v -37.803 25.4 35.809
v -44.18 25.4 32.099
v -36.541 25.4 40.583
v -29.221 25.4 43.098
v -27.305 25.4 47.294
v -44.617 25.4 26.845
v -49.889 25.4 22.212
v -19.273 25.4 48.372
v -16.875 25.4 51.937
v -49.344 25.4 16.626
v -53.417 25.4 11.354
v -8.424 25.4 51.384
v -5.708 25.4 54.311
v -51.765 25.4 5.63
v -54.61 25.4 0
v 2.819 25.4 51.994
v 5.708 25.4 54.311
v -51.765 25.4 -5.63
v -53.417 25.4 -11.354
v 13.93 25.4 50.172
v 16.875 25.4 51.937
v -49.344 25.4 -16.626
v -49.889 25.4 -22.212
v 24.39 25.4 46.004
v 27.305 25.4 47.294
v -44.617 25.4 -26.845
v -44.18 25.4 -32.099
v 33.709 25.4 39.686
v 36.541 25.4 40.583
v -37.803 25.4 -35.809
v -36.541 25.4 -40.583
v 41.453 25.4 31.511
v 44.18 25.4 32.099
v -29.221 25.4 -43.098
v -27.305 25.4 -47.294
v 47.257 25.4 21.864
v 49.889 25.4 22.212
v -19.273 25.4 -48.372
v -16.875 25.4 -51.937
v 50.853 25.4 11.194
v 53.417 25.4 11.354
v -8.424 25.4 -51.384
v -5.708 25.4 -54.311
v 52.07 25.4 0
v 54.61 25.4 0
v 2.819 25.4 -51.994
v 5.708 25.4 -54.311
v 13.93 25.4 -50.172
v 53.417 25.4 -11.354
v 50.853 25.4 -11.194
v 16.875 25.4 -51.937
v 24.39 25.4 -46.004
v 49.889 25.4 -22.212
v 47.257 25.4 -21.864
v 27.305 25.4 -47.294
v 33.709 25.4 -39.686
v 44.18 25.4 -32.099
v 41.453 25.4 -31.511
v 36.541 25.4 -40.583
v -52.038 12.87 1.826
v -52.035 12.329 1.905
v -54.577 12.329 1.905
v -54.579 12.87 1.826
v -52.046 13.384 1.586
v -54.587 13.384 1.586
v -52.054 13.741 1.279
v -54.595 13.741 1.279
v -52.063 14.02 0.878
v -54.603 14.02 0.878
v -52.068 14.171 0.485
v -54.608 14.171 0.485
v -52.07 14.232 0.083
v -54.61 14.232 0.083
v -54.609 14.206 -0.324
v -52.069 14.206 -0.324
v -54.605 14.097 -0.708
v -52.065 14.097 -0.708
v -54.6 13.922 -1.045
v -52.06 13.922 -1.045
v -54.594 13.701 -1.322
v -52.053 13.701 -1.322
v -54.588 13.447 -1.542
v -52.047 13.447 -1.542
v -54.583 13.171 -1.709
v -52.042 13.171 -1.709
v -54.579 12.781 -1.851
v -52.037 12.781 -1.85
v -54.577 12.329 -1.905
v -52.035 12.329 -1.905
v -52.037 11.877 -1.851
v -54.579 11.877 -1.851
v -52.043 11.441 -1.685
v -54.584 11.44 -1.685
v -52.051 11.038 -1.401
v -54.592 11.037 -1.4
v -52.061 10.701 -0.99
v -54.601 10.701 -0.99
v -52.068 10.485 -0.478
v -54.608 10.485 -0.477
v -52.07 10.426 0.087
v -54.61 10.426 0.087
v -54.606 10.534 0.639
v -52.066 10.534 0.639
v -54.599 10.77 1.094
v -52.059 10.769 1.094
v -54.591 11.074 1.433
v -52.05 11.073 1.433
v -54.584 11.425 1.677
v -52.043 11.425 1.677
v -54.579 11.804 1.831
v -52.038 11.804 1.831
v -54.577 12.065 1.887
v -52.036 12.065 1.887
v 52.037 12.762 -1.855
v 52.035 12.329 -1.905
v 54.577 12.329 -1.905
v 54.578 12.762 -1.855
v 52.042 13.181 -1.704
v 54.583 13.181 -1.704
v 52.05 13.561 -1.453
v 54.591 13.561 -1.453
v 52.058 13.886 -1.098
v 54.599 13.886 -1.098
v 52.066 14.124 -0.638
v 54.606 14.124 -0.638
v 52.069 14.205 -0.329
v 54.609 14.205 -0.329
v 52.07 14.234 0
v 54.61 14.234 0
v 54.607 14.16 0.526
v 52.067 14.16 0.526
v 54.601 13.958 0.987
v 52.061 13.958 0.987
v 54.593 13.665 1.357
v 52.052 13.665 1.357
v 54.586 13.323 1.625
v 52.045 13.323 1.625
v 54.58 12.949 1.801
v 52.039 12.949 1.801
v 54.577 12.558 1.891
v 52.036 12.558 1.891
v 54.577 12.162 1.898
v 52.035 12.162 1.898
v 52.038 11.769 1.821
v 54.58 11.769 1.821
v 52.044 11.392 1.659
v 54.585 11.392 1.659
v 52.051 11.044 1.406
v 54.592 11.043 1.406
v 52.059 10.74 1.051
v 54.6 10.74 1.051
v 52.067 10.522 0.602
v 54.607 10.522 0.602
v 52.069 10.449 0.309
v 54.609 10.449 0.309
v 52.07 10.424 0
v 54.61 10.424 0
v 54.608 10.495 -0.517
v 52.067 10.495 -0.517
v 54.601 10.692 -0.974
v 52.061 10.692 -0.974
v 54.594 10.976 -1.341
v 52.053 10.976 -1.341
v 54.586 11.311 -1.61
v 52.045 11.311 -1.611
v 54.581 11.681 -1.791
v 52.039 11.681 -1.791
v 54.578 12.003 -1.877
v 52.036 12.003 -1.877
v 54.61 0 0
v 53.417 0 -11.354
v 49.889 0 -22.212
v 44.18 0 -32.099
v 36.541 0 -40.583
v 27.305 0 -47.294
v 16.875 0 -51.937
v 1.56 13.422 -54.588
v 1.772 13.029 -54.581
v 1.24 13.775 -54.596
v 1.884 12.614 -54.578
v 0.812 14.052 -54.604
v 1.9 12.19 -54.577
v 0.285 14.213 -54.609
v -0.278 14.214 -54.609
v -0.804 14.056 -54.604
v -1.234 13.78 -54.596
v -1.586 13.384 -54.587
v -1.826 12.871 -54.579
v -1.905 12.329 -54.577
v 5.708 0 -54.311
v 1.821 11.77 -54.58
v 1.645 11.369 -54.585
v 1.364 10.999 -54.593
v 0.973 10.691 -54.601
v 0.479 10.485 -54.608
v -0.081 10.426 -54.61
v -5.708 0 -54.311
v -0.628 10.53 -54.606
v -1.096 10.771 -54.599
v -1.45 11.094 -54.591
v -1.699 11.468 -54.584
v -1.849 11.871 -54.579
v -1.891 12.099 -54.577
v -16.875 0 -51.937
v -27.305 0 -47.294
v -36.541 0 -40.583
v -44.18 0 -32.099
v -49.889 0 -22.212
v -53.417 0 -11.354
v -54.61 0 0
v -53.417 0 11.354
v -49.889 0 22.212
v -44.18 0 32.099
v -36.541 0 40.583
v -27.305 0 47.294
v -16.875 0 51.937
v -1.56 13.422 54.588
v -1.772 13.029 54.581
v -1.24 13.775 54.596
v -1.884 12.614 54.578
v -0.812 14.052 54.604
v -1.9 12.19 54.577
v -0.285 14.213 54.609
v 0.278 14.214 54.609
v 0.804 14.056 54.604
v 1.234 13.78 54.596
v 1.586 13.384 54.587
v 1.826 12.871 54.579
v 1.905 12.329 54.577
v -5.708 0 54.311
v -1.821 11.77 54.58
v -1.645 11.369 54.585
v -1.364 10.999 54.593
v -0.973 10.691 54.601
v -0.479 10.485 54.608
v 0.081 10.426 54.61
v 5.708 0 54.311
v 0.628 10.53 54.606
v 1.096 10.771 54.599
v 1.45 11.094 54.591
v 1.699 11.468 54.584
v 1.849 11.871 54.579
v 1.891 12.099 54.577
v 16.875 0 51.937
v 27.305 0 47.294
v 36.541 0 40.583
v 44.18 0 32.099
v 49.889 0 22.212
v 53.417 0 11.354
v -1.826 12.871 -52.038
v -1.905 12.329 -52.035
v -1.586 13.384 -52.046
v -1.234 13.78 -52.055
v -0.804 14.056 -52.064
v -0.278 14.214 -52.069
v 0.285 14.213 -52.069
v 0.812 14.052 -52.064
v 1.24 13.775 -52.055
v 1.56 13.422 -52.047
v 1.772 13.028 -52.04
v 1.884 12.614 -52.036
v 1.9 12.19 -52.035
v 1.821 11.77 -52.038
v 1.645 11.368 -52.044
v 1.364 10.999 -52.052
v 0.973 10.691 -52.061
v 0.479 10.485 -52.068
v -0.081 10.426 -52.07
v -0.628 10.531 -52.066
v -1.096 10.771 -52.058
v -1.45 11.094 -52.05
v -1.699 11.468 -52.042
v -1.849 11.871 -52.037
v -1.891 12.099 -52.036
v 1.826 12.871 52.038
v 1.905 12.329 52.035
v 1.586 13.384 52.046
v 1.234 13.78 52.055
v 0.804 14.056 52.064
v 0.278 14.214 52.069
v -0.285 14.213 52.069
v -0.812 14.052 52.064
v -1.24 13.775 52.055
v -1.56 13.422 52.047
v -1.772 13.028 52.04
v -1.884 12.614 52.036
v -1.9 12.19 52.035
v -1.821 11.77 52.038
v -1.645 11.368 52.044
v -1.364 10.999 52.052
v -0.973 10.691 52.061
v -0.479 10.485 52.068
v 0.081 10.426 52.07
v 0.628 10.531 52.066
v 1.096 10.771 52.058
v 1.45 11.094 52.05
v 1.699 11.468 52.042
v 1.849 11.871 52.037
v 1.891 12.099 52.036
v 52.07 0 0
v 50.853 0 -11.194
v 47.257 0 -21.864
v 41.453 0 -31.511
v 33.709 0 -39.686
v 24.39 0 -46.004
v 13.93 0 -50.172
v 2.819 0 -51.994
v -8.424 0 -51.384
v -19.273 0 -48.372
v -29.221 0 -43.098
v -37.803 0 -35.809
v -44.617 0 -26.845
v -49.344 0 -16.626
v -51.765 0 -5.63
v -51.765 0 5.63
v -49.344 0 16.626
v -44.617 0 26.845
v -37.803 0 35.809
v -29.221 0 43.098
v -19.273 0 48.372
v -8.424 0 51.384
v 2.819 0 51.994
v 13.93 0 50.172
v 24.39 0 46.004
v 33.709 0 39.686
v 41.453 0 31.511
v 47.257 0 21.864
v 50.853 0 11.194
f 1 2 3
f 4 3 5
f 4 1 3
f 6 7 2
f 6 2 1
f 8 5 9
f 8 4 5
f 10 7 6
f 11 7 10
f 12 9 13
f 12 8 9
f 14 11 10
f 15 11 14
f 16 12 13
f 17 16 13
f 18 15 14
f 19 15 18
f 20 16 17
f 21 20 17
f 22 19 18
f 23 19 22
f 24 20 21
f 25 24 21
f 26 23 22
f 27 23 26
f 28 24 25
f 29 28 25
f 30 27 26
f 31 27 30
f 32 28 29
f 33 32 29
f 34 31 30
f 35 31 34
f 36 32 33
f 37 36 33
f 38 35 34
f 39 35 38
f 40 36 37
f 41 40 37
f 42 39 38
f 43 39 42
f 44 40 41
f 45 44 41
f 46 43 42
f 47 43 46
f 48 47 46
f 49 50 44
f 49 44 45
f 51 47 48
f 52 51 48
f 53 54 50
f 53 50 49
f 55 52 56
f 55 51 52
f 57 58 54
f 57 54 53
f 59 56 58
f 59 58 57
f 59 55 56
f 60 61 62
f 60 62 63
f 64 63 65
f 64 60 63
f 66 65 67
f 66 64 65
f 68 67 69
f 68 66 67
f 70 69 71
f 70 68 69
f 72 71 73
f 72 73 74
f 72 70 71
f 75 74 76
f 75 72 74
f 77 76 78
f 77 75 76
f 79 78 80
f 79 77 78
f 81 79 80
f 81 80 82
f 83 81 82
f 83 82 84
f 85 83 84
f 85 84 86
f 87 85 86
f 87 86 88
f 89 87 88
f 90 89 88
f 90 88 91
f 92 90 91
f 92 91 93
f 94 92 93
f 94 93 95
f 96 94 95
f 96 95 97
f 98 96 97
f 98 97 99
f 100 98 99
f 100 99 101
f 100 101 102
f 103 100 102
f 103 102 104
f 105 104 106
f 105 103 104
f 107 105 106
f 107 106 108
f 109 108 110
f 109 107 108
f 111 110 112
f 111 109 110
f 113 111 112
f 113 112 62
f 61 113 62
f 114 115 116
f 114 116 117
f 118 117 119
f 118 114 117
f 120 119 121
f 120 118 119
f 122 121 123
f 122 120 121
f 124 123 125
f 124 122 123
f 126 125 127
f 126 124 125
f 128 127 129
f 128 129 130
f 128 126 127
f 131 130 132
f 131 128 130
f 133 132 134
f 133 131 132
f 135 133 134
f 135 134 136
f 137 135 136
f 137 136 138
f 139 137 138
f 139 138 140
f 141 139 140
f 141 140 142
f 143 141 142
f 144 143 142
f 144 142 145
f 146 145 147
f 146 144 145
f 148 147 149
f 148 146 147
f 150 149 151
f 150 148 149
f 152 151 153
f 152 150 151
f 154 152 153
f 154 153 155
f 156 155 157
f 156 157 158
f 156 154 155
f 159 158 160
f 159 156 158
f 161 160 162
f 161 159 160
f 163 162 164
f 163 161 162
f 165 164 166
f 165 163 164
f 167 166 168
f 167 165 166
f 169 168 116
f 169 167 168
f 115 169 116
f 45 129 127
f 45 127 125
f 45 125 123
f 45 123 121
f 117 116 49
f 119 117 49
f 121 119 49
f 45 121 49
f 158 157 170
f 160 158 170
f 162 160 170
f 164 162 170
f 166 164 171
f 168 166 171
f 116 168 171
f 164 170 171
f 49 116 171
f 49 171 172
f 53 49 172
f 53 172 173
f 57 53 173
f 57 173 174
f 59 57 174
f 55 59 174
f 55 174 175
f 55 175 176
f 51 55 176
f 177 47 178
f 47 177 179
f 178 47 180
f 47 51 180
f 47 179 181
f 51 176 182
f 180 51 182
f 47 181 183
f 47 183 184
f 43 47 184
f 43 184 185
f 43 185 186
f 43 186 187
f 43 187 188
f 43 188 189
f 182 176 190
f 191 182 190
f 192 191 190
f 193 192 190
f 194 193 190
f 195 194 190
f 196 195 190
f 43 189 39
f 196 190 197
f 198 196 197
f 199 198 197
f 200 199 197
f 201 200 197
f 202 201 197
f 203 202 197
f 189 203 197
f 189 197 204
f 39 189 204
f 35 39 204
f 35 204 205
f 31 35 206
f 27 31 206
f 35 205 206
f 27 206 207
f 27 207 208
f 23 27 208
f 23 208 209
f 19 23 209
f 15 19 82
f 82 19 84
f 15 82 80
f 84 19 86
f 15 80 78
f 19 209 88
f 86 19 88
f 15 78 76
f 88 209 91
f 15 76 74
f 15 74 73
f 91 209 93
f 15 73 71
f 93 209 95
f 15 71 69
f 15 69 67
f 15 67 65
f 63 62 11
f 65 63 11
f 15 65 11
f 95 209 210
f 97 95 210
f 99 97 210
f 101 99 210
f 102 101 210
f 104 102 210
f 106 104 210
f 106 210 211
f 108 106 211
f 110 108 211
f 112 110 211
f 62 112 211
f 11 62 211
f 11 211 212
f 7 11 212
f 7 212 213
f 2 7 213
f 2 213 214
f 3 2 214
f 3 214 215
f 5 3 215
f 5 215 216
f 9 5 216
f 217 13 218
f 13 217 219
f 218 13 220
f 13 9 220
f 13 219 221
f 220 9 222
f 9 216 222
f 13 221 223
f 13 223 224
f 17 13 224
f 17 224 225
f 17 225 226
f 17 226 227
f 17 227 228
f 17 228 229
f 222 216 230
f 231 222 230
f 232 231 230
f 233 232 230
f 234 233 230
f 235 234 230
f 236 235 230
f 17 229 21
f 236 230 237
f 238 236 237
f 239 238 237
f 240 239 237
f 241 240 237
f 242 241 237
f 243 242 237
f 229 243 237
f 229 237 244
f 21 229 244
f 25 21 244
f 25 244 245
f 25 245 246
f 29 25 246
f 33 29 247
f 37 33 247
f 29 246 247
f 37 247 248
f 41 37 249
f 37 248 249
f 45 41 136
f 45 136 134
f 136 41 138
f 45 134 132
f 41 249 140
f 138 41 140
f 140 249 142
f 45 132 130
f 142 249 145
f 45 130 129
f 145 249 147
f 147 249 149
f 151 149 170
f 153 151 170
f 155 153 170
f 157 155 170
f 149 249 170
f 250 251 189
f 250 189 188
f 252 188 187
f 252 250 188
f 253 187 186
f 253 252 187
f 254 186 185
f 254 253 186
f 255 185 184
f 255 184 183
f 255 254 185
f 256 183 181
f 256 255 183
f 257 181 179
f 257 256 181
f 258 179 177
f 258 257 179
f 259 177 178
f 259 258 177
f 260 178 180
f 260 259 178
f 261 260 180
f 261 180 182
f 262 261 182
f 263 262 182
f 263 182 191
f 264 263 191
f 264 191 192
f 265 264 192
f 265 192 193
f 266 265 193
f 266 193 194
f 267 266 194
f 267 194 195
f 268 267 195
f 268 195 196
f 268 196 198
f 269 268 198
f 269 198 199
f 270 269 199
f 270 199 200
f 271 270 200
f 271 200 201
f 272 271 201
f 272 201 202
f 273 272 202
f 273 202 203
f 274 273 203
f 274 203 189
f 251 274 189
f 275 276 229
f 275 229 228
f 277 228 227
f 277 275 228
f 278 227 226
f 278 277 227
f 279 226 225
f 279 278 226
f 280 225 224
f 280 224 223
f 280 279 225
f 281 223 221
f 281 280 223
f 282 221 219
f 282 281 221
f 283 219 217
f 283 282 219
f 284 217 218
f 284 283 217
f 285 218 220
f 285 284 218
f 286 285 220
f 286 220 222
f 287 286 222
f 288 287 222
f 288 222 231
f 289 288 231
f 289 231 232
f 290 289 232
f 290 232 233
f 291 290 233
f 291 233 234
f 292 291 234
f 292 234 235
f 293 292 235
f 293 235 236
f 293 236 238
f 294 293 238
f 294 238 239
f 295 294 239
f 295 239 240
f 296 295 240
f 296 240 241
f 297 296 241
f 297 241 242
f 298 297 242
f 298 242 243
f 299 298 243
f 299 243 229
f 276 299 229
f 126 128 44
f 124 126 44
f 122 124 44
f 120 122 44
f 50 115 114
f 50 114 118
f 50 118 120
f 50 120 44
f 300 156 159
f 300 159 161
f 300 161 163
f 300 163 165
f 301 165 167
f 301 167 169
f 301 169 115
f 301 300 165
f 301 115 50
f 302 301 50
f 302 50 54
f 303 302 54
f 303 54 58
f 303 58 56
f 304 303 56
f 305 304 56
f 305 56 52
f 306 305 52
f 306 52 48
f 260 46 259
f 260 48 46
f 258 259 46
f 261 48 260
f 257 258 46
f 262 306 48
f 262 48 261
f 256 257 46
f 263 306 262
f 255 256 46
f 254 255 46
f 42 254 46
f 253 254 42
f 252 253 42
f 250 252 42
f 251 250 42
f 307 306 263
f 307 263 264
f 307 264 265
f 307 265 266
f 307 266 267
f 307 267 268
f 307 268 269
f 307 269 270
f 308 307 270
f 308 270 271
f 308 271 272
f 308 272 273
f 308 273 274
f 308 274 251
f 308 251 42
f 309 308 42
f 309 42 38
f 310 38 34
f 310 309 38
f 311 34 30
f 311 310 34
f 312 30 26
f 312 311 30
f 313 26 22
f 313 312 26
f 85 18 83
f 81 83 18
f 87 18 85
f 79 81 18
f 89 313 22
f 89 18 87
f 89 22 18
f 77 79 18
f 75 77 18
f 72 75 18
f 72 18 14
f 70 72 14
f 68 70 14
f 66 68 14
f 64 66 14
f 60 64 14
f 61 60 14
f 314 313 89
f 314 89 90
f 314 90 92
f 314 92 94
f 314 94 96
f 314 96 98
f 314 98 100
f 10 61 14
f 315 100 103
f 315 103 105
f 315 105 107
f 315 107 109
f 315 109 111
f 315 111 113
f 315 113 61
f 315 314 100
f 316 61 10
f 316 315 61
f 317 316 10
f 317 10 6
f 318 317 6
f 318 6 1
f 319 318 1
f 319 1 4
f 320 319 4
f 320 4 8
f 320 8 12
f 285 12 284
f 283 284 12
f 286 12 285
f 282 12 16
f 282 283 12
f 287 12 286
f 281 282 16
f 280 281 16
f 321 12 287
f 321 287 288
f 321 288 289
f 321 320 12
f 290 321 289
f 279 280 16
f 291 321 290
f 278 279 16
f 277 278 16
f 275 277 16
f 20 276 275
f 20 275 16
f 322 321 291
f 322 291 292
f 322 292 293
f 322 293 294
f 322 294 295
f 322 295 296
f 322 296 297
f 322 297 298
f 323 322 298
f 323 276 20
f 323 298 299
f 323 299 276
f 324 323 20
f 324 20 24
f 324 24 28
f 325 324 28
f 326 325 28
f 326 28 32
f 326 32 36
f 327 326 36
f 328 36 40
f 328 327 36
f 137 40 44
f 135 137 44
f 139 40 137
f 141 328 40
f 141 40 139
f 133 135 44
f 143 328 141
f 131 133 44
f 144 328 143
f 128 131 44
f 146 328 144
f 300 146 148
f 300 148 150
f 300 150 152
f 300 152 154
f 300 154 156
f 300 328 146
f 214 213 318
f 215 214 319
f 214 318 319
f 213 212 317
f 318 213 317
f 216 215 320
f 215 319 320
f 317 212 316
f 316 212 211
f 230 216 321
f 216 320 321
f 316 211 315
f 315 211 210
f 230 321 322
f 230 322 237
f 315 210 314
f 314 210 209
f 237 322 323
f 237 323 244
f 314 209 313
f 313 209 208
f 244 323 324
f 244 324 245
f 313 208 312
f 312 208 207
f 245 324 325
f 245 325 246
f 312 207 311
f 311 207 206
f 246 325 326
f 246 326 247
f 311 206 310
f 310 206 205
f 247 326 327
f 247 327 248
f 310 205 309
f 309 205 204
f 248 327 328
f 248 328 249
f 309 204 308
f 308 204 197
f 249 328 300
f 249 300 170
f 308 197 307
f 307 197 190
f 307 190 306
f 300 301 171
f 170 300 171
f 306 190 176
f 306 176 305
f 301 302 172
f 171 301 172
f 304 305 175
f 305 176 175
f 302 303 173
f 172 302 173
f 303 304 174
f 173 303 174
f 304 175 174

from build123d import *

# Parameters (mm, degrees)
SKETCH1_R           = 54.61
SKETCH1_R_2         = 52.07
BOSS_EXTRUDE1_DEPTH = 25.4
SKETCH3_R           = 1.905
CUT_EXTRUDE1_DEPTH  = 55.61
CIRPATTERN1_COUNT   = 4


with BuildPart() as part:
    # Sketch1 → Boss-Extrude1 (new body)
    with BuildSketch(Plane(origin=(0, 0, 0), x_dir=(1, 0, 0), z_dir=(0, 1, 0))):
        Circle(SKETCH1_R)
        Circle(SKETCH1_R_2, mode=Mode.SUBTRACT)
    extrude(amount=BOSS_EXTRUDE1_DEPTH)

    # Sketch3 → Cut-Extrude1 (cut, through all)
    with BuildSketch(Plane.XY):
        with Locations((0, 12.328955527)):
            Circle(SKETCH3_R)
    cut_extrude1 = extrude(amount=CUT_EXTRUDE1_DEPTH, mode=Mode.SUBTRACT)

    # CirPattern1: Cut-Extrude1 ×4 about axis
    cirpattern1_axis = Axis((0, 25.4, 0), (0, 1, 0))
    for i in range(1, CIRPATTERN1_COUNT):
        add(cut_extrude1.rotate(cirpattern1_axis, i * 360 / CIRPATTERN1_COUNT), mode=Mode.SUBTRACT)


solid = part.part
